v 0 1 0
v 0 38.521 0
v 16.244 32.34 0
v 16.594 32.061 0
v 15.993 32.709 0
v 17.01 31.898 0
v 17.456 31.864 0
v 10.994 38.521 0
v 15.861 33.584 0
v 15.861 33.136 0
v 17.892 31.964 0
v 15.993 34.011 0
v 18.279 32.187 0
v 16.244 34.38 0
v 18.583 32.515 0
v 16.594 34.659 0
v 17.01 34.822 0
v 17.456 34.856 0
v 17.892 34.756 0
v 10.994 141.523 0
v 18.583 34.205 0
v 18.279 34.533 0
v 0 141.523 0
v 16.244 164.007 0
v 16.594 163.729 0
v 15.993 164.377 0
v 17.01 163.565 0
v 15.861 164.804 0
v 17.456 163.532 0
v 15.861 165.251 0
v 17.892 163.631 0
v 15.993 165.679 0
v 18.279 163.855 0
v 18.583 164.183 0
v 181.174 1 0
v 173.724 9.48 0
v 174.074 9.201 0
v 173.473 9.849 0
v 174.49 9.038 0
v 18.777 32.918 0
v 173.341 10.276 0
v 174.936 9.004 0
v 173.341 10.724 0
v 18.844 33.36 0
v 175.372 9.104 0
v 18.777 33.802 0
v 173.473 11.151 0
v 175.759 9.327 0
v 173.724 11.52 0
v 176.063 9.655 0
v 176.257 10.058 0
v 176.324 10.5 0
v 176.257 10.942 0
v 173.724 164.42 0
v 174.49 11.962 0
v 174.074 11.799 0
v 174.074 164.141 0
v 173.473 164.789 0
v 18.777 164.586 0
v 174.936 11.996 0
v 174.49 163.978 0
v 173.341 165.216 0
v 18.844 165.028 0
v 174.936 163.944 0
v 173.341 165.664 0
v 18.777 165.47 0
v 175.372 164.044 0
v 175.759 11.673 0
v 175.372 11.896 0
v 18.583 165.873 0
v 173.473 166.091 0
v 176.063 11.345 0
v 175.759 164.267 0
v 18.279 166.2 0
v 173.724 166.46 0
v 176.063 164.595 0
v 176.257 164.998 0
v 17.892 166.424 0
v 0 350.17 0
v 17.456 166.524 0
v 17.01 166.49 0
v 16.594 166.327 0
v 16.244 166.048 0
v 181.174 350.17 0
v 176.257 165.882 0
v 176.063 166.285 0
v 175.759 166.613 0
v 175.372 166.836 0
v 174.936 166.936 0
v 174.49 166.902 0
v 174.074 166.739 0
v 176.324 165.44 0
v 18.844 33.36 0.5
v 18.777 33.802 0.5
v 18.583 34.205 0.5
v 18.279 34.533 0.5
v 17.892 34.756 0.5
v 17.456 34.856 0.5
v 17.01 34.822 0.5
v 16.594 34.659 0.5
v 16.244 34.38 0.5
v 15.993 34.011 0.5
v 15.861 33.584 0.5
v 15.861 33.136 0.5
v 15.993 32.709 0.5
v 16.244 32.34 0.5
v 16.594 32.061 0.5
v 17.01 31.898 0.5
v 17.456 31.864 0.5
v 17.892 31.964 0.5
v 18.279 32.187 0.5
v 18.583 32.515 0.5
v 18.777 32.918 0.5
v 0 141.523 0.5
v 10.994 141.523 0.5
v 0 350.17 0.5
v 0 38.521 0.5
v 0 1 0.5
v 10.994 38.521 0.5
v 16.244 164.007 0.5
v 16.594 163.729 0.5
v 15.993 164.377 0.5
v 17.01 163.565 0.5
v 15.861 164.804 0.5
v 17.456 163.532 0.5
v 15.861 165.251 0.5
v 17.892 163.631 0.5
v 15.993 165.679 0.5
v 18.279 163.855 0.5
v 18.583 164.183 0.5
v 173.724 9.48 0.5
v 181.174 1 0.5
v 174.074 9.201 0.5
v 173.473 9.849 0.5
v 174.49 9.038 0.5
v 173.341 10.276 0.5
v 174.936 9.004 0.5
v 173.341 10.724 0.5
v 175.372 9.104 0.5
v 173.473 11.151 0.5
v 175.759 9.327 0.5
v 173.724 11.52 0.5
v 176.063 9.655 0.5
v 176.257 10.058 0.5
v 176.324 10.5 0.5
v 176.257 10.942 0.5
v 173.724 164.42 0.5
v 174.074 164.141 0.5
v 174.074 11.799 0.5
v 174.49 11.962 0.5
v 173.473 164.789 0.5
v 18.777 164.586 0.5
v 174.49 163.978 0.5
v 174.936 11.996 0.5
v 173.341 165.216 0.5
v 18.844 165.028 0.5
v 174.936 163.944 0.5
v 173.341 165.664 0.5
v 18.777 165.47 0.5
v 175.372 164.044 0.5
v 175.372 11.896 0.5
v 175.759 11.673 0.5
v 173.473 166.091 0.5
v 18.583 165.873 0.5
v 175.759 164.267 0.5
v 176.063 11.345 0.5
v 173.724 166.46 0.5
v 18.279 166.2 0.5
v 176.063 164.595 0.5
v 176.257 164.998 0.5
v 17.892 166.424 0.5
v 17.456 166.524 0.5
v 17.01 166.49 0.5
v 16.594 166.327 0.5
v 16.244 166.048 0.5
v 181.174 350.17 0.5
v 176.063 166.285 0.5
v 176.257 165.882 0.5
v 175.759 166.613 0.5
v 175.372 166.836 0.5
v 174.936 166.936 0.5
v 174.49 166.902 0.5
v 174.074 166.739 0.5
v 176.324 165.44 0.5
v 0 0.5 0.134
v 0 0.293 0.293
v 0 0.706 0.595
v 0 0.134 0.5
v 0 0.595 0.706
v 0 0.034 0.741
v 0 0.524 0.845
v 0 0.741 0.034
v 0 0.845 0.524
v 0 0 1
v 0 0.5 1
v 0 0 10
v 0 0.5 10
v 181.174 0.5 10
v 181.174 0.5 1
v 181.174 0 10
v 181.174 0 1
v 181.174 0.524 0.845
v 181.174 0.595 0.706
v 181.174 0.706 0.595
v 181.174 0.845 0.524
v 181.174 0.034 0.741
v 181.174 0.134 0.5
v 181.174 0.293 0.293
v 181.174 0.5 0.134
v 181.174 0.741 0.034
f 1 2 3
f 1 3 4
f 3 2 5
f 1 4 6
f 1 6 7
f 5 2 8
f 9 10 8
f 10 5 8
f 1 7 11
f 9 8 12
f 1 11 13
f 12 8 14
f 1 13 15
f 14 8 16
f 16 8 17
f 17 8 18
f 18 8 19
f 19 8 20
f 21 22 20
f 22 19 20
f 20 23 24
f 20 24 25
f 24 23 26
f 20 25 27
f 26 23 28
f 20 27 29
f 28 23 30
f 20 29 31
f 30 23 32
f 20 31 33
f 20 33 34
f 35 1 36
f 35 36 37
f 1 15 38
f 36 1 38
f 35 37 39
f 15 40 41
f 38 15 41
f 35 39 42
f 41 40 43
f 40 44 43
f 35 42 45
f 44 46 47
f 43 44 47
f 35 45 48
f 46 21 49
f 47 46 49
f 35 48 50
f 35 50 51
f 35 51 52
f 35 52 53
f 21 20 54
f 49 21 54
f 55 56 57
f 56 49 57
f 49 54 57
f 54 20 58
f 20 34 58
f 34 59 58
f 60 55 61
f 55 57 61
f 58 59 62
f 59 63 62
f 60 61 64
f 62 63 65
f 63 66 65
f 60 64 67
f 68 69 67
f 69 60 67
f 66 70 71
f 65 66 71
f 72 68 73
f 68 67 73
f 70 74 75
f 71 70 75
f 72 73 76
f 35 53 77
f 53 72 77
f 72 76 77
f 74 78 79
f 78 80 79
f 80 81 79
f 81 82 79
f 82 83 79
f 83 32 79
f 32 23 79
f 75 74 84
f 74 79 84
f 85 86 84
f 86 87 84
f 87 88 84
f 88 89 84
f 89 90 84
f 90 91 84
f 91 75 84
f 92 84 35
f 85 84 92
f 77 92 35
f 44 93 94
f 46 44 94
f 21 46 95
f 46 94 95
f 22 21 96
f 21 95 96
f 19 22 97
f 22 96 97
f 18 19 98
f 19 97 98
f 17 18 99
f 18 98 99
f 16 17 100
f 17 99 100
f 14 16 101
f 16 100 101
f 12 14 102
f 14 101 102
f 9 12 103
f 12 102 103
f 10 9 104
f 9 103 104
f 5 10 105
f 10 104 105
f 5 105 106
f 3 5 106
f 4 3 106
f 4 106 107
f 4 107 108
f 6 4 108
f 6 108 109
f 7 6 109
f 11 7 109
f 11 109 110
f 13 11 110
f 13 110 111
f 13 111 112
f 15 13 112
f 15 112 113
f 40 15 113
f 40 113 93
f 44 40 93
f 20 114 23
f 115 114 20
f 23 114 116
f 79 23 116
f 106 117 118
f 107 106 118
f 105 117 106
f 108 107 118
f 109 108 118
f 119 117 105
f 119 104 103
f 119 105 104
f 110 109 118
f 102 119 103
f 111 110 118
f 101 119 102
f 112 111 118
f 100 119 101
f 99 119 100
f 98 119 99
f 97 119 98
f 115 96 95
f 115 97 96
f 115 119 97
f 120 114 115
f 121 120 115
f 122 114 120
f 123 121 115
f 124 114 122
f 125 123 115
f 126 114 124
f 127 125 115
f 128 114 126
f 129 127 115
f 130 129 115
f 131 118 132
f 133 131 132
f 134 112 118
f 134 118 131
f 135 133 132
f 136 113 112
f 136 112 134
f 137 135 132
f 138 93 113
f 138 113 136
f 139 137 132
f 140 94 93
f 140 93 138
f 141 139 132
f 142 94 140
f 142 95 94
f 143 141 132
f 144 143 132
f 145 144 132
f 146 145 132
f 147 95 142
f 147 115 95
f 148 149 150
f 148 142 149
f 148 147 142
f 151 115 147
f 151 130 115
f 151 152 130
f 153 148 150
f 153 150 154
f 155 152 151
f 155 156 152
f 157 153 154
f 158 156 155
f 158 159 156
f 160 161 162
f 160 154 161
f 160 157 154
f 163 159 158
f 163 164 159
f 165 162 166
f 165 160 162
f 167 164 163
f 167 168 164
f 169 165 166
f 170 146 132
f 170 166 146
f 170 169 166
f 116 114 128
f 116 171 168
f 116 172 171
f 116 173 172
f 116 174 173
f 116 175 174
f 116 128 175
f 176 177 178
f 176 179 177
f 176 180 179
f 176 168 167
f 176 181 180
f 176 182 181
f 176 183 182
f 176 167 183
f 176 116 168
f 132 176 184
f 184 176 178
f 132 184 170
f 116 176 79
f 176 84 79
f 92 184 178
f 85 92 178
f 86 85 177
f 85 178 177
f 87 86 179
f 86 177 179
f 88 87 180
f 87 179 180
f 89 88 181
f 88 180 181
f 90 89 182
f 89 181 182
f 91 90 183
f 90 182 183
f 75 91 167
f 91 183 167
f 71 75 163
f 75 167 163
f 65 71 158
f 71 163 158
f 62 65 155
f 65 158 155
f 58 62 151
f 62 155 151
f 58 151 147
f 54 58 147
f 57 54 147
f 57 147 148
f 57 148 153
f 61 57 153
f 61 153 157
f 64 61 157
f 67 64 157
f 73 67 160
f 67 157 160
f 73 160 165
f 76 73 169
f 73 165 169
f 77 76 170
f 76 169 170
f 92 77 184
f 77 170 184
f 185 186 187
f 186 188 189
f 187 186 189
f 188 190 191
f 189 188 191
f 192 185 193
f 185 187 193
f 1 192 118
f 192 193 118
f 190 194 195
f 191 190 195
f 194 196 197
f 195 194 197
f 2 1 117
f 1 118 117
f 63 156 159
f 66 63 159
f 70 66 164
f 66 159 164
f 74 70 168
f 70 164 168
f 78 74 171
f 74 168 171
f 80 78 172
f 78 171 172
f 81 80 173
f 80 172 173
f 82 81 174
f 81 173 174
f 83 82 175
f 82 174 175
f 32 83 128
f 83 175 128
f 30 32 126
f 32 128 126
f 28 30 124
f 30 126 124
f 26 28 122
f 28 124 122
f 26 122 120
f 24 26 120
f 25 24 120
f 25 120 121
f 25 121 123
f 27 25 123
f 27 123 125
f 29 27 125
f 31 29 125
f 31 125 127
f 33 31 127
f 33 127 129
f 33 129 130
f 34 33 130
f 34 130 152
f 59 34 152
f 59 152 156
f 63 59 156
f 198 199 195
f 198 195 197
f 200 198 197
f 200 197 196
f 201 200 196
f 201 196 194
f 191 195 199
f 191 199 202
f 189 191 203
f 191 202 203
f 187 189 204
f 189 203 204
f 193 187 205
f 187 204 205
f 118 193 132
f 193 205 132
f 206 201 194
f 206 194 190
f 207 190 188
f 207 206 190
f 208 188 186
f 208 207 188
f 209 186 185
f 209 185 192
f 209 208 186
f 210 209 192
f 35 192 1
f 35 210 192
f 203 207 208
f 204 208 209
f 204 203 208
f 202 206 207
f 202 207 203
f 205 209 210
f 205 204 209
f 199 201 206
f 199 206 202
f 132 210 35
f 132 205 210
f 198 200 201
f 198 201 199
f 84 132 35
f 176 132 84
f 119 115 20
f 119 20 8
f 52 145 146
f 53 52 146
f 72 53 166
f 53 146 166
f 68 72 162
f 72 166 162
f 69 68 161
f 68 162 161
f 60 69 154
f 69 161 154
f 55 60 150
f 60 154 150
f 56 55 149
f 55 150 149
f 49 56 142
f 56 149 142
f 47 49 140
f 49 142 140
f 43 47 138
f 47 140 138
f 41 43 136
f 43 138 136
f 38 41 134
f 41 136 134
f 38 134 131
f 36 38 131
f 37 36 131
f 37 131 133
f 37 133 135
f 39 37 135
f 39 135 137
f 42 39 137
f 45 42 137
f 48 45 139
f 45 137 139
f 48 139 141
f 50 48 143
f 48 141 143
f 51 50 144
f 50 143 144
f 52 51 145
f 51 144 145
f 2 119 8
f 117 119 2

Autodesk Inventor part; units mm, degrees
ref_plane "YZ Plane" through (0, 0, 0) normal (1, 0, 0) x (0, 1, 0)
ref_plane "XZ Plane" through (0, 0, 0) normal (0, 1, 0) x (-1, 0, 0)
ref_plane "XY Plane" through (0, 0, 0) normal (0, 0, 1) x (1, 0, 0)
sketch "Sketch1" plane through (0, 0, 0) normal (0, 0, 1) x (1, 0, 0)
  line L0 (0, 0) -> (181.174, 0)
  line L1 (181.174, 0) -> (181.174, 350.17)
  line L2 (181.174, 350.17) -> (0, 350.17)
  line L3 (0, 350.17) -> (0, 0)
  dimension "d0" = 181.174
  dimension "d1" = 350.17
extrude "Plate1" add sketch "Sketch1" along normal blind 0.5
sketch "Sketch3" plane through (181.174, 0.5, 0) normal (0, -1, 0) x (1, 0, 0)
  line L0 (-181.174, 0) -> (0, 0)
  line L1 (0, 0) -> (0, 10)
  line L2 (0, 10) -> (-181.174, 10)
  line L3 (-181.174, 10) -> (-181.174, 0)
edge flange "Flange1" height 10 angle 90 thickness 0.5 bend radius 0.5 thickness toward (0, -1, 0) relief tear relief width 0.5 relief depth 0.25 edges at (90.587, 0, 0.5) wall of the first edge with corners at (0, 0.5, 0) (181.174, 0.5, 0) (181.174, 0.5, 10) (0, 0.5, 10)
bend "Bend1"
corner "Corner1"
sketch "Sketch4" plane through (0, 0, 0.5) normal (0, 0, 1) x (1, 0, 0)
  line L0 (181.174, 350.17) -> (181.174, 1) projected
  line L1 (10.4326, 171.5141) -> (10.4326, 6.5941)
  arc A0 (10.4326, 6.5941) -> (12.9726, 4.0541) centre (12.9726, 6.5941) ccw
  line L2 (177.8926, 4.0541) -> (12.9726, 4.0541)
  arc A1 (177.8926, 4.0541) -> (180.4326, 6.5941) centre (177.8926, 6.5941) ccw
  line L3 (180.4326, 171.5141) -> (180.4326, 6.5941)
  arc A2 (180.4326, 171.5141) -> (177.8926, 174.0541) centre (177.8926, 171.5141) ccw
  line L4 (177.8926, 174.0541) -> (12.9726, 174.0541)
  arc A3 (12.9726, 174.0541) -> (10.4326, 171.5141) centre (12.9726, 171.5141) ccw
  circle A4 centre (174.0826, 14.2141) radius 2.032
  circle A5 centre (174.0826, 169.1541) radius 2.032
  circle A6 centre (16.6026, 169.1541) radius 2.032
  circle A7 centre (16.6026, 37.0741) radius 2.032
  line L5 (181.174, 0) -> (181.174, 10.5)
  line L6 (181.174, 1) -> (181.174, 350.17) projected
  line L7 (181.174, 10.5) -> (174.824, 10.5) construction
  circle A8 centre (174.824, 10.5) radius 1.5
  line L8 (174.824, 10.5) -> (17.344, 10.5) construction
  line L9 (17.344, 10.5) -> (17.344, 33.36) construction
  circle A9 centre (17.344, 33.36) radius 1.5
  line L10 (17.344, 33.36) -> (17.344, 165.44) construction
  circle A10 centre (17.344, 165.0277) radius 1.5
  line L11 (174.824, 10.5) -> (174.824, 165.44) construction
  circle A11 centre (174.824, 165.44) radius 1.5
  point P0 (0, 0)
  point P1 (95.4326, 89.0541)
  dimension "d26" = 10.5
  dimension "d27" = 6.35
  dimension "d28" = 3
  dimension "d29" = 157.48
  dimension "d30" = 22.86
  dimension "d31" = 3
  dimension "d32" = 132.08
  dimension "d33" = 3
  dimension "d34" = 154.94
  dimension "d35" = 3
extrude "Extrusion2" cut sketch "Sketch4" against normal blind 10 contours A8 | A9 | A10 | A11
sketch "Sketch5" plane through (0, 0, 0.5) normal (0, 0, 1) x (1, 0, 0)
  circle A0 centre (17.344, 165.0277) radius 1.5 projected
  line L0 (0, 1) -> (0, 350.17) projected
  line L1 (17.344, 165.0277) -> (17.344, 131.5227) construction
  line L2 (17.344, 131.5227) -> (17.344, 43.5207) construction
  line L3 (17.344, 131.5227) -> (10.994, 131.5227) construction
  line L4 (10.994, 131.5227) -> (0, 131.5227)
  line L5 (0, 131.5227) -> (0, 43.5207)
  line L6 (0, 43.5207) -> (10.994, 43.5207)
  line L7 (10.994, 43.5207) -> (10.994, 131.5227)
  line L8 (10.994, 131.5227) -> (0, 131.5227)
  line L9 (0, 131.5227) -> (0, 141.5227)
  line L10 (0, 141.5227) -> (10.994, 141.5227)
  line L11 (10.994, 141.5227) -> (10.994, 131.5227)
  line L12 (0, 43.5207) -> (10.994, 43.5207)
  line L13 (10.994, 43.5207) -> (10.994, 38.5207)
  line L14 (10.994, 38.5207) -> (0, 38.5207)
  line L15 (0, 38.5207) -> (0, 43.5207)
  point P0 (0, 0)
  dimension "d38" = 33.505
  dimension "d39" = 88.002
  dimension "d40" = 6.35
  dimension "d43" = 10
  dimension "d44" = 5
extrude "Extrusion4" cut sketch "Sketch5" against normal blind 10 contours L0 L6 L13 L14 | L0 L4 L7 L6 | L0 L10 L11 L4
equation "\"d2\" = Thickness"
equation "\"d16\" = BendReliefWidth"
equation "\"d17\" = BendReliefDepth"
equation "\"d18\" = MinimumRemnant"
equation "\"d19\" = TransitionRadius"
equation "\"d22\" = BendRadius"
equation "\"d23\" = CornerReliefSize"
equation "\"d24\" = GapSize"
equation "\"d25\" = JacobiRadiusSize"
equation "\"BendRadius\" = Thickness"
equation "\"BendReliefWidth\" = Thickness"
equation "\"BendReliefDepth\" = 0.5 * Thickness"
equation "\"CornerReliefSize\" = 4 * Thickness"
equation "\"MinimumRemnant\" = 2 * Thickness"
equation "\"TransitionRadius\" = BendRadius"
equation "\"JacobiRadiusSize\" = BendRadius"
equation "\"GapSize\" = Thickness"
equation "\"Thickness\" = 0.5"
properties part number "my trunk"
